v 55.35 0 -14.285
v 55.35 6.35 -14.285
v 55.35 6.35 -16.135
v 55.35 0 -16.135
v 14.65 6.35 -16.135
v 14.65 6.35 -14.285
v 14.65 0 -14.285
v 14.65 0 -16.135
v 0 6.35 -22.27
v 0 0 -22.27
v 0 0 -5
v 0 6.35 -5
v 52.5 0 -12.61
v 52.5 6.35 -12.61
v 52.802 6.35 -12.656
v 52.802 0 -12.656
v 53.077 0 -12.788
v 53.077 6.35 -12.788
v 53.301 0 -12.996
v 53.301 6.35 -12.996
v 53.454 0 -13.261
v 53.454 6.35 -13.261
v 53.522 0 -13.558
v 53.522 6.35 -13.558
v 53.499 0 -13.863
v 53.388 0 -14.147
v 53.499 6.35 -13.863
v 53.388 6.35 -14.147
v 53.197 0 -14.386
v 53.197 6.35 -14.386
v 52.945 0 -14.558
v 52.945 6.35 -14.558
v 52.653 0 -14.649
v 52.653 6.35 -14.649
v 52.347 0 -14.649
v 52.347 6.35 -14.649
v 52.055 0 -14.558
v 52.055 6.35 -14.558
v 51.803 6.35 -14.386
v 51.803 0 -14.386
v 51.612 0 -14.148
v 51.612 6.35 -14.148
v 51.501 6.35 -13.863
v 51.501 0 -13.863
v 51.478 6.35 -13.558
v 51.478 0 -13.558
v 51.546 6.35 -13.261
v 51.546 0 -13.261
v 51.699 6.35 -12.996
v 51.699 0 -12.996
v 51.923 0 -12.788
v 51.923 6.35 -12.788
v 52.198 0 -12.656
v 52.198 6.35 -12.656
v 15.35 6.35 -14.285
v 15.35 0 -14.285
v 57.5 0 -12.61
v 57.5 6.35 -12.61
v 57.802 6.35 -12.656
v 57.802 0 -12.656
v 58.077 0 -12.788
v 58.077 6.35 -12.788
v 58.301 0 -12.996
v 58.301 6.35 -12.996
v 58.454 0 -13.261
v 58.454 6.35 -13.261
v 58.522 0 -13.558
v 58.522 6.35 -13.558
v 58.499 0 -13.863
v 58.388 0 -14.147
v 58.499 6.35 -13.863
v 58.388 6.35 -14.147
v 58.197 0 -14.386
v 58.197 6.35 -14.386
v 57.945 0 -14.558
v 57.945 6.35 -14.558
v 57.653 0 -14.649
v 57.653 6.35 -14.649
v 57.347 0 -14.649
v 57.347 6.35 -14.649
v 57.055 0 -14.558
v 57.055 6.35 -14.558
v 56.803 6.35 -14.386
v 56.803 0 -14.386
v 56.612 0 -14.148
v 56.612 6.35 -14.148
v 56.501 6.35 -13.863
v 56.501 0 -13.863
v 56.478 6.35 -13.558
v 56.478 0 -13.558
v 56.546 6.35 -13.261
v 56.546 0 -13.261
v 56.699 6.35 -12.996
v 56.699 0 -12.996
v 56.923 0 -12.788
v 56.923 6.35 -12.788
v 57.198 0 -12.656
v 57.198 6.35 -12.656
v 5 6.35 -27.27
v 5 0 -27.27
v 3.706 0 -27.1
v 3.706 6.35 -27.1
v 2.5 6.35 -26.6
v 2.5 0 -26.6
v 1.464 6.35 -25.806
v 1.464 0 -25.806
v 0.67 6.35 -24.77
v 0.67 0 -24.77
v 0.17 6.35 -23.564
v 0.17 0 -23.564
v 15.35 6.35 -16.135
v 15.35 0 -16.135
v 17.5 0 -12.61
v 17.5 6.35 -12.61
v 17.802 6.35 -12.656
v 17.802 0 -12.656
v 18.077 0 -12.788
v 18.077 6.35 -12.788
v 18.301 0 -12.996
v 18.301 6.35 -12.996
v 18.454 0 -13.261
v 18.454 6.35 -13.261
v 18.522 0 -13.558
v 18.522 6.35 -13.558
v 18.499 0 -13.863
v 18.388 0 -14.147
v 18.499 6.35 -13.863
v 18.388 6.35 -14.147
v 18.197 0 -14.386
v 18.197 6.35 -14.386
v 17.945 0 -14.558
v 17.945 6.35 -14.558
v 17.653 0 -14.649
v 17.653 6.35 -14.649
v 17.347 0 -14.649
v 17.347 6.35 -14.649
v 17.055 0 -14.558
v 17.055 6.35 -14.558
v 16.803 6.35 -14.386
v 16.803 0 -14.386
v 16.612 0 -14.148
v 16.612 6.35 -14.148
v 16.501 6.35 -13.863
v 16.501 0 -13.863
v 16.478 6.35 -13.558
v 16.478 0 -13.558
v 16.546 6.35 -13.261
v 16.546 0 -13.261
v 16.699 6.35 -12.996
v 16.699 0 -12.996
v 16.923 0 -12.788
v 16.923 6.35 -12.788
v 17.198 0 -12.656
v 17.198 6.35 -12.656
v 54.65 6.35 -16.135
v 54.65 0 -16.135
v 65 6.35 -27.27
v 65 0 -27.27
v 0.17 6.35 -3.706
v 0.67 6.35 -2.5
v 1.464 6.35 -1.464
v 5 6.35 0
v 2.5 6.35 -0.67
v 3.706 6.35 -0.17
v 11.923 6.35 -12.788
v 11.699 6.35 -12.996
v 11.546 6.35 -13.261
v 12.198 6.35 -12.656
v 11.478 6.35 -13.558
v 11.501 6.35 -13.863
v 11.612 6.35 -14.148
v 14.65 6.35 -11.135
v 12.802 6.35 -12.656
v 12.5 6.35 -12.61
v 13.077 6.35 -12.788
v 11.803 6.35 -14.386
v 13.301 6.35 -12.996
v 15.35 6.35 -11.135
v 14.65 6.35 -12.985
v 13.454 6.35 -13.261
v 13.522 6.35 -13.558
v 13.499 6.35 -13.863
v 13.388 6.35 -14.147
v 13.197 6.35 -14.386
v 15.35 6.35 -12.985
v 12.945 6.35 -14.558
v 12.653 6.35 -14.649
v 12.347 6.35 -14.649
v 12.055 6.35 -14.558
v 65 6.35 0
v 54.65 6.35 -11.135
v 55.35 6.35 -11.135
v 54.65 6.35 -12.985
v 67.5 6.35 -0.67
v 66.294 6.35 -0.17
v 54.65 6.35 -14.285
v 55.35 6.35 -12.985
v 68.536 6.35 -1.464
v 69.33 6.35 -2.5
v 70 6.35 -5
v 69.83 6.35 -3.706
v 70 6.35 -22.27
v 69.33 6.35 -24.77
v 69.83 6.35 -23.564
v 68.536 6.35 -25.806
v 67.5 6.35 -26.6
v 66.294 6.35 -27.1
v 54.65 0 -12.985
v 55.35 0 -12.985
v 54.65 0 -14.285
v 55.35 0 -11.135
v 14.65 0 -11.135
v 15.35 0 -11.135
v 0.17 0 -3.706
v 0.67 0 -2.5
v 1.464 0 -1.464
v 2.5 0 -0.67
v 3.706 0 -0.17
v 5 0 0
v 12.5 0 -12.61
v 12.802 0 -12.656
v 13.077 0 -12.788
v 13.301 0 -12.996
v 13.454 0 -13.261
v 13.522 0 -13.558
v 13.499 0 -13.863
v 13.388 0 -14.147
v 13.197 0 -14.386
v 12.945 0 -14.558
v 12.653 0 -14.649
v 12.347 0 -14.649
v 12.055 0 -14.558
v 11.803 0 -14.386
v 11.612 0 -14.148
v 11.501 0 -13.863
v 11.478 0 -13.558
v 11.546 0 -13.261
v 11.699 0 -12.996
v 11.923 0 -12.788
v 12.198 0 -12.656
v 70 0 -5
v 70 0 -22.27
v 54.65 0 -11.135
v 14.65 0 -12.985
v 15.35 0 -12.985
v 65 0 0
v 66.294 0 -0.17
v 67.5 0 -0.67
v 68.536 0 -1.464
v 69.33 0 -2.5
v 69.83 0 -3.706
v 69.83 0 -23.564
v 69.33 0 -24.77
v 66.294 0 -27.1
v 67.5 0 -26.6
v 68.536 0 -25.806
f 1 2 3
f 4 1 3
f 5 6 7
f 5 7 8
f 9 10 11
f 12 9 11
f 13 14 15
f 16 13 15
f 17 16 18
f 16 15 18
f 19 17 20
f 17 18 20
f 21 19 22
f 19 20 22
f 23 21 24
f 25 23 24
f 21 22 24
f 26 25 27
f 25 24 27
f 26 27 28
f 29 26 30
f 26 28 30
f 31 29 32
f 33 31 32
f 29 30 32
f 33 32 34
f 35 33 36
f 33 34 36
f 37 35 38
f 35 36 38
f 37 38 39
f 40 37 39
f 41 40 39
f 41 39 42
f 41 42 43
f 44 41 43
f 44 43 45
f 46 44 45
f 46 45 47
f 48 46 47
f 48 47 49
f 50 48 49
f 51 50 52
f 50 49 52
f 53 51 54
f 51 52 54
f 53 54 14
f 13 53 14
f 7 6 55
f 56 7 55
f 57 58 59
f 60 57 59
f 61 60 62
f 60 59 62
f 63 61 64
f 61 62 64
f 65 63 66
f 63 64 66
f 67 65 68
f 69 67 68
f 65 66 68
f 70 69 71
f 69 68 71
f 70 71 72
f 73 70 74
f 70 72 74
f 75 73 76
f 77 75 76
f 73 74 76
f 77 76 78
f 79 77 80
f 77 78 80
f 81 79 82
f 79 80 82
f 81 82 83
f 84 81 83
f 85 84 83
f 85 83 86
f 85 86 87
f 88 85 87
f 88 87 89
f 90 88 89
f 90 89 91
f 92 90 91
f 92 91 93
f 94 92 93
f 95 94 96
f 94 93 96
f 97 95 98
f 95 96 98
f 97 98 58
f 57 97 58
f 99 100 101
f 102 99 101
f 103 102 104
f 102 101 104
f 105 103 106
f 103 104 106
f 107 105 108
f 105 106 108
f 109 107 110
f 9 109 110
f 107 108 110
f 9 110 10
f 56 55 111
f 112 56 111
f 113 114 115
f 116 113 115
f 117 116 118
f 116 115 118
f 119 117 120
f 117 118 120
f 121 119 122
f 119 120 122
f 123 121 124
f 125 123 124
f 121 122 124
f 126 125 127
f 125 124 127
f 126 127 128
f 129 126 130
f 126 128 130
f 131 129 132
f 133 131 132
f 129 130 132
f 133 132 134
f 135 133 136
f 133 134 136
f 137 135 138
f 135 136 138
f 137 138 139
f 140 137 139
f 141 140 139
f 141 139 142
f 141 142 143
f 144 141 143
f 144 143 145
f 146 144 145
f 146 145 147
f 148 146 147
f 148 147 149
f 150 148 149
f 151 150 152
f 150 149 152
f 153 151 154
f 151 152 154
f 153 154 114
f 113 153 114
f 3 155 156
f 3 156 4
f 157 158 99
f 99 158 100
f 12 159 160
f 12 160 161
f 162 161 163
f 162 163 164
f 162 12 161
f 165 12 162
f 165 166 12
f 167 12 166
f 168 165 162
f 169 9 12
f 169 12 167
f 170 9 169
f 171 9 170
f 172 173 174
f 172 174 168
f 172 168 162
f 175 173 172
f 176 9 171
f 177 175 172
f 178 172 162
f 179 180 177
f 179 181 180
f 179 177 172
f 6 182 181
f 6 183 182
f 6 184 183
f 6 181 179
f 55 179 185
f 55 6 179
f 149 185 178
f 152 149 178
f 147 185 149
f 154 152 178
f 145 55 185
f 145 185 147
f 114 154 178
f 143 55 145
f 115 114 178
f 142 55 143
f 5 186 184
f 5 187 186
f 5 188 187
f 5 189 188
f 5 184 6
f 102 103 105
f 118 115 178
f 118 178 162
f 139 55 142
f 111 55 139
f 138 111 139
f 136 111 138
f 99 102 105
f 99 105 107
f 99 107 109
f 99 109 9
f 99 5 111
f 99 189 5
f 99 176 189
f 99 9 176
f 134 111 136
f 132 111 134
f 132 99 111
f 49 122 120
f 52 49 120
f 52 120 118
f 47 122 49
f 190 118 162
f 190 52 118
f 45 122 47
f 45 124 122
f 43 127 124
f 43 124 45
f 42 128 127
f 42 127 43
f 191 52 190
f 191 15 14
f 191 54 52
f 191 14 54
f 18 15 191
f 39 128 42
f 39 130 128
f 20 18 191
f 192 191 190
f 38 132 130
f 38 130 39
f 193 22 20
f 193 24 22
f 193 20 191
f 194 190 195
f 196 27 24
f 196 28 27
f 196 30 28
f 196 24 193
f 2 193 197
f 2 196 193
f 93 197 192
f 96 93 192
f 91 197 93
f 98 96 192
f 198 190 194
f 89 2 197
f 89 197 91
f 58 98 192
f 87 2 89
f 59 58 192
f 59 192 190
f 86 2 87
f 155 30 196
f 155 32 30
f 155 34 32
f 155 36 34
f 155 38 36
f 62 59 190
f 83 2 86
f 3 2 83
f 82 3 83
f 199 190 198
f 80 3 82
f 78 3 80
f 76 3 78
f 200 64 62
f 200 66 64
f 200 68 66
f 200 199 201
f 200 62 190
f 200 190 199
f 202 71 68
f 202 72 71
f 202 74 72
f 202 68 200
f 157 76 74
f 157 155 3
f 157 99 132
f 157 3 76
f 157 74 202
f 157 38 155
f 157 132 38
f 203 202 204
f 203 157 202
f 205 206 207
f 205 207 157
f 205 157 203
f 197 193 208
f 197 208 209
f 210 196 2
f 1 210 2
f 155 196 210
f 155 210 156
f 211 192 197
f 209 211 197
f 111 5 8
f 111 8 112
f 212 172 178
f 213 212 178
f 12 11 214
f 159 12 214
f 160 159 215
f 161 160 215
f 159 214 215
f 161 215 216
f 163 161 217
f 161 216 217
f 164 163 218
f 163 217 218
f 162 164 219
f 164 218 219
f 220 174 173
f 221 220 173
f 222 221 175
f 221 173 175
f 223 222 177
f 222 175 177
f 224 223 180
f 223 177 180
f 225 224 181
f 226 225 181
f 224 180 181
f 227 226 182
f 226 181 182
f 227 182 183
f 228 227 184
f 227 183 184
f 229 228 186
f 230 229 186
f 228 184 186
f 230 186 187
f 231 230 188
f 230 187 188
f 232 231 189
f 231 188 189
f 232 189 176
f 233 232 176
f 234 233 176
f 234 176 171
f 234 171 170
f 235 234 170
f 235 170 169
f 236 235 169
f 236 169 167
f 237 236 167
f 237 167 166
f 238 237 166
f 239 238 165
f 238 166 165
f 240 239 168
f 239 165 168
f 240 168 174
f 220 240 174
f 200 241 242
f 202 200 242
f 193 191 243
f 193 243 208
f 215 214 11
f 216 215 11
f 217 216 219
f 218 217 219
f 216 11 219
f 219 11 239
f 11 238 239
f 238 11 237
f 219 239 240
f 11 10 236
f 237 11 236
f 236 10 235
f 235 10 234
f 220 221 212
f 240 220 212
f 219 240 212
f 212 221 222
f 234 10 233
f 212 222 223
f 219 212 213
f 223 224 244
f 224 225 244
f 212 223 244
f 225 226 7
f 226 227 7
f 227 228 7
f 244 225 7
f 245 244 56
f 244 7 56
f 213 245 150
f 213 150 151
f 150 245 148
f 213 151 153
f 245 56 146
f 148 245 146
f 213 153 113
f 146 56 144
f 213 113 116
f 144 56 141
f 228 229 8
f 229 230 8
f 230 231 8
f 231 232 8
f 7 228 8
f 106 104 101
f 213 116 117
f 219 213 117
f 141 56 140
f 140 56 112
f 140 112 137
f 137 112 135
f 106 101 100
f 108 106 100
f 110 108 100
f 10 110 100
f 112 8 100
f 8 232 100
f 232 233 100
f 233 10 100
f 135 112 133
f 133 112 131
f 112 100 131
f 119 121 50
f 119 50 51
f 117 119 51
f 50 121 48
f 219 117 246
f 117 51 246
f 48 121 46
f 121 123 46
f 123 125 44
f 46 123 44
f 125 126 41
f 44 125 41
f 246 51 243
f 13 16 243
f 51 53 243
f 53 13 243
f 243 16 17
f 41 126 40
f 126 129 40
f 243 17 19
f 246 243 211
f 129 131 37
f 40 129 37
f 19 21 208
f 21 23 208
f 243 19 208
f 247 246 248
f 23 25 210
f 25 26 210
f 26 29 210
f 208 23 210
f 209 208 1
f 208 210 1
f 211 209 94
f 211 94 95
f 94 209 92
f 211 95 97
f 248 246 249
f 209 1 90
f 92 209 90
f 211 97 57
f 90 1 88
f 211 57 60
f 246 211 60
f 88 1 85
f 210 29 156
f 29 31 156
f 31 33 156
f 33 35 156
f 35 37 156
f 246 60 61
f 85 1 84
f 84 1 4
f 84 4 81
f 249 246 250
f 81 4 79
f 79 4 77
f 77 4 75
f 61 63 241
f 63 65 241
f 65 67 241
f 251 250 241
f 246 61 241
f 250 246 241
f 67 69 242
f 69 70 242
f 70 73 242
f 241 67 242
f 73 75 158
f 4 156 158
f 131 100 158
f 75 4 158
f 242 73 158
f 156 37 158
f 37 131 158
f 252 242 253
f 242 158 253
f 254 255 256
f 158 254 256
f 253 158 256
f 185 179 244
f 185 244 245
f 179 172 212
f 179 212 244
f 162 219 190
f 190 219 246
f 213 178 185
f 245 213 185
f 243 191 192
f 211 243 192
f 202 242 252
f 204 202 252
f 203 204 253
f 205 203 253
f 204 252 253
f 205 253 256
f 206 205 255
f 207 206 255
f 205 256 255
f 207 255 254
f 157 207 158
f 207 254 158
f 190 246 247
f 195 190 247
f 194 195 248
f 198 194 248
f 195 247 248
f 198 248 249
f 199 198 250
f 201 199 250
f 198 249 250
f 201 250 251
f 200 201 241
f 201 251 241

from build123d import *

# Parameters (mm, degrees)
BOSS_EXTRUDE1_DEPTH = 6.35
SKETCH2_R           = 1.025
SKETCH2_W           = 0.7
SKETCH2_H           = 1.85
CUT_EXTRUDE1_DEPTH  = 6.35


with BuildPart() as part:
    # Sketch1 → Boss-Extrude1 (new body)
    with BuildSketch(Plane(origin=(0, 0, 0), x_dir=(1, 0, 0), z_dir=(0, 1, 0))):
        with BuildLine():
            Line((5, 0), (65, 0))
            ThreePointArc((65, 0), (68.535533906, 1.464466094), (70, 5))
            Line((70, 5), (70, 22.27))
            ThreePointArc((70, 22.27), (68.535533906, 25.805533906), (65, 27.27))
            Line((65, 27.27), (5, 27.27))
            ThreePointArc((5, 27.27), (1.464466094, 25.805533906), (0, 22.27))
            Line((0, 22.27), (0, 5))
            ThreePointArc((0, 5), (1.464466094, 1.464466094), (5, 0))
        make_face()
    extrude(amount=BOSS_EXTRUDE1_DEPTH)

    # Sketch2 → Cut-Extrude1 (cut)
    with BuildSketch(Plane(origin=(0, 6.35, 0), x_dir=(1, 0, 0), z_dir=(0, 1, 0))):
        with Locations(Location((12.5, 13.635, 0), (0, 0, 270))):
            Circle(SKETCH2_R)
        with Locations(Location((17.5, 13.635, 0), (0, 0, 270))):
            Circle(SKETCH2_R)
        with Locations(Location((52.5, 13.635, 0), (0, 0, 270))):
            Circle(SKETCH2_R)
        with Locations(Location((57.5, 13.635, 0), (0, 0, 270))):
            Circle(SKETCH2_R)
        with Locations((15, 15.21)):
            Rectangle(SKETCH2_W, SKETCH2_H)
        with Locations((15, 12.06)):
            Rectangle(SKETCH2_W, SKETCH2_H)
        with Locations((55, 12.06)):
            Rectangle(SKETCH2_W, SKETCH2_H)
        with Locations((55, 15.21)):
            Rectangle(SKETCH2_W, SKETCH2_H)
    extrude(amount=-CUT_EXTRUDE1_DEPTH, mode=Mode.SUBTRACT)


solid = part.part
